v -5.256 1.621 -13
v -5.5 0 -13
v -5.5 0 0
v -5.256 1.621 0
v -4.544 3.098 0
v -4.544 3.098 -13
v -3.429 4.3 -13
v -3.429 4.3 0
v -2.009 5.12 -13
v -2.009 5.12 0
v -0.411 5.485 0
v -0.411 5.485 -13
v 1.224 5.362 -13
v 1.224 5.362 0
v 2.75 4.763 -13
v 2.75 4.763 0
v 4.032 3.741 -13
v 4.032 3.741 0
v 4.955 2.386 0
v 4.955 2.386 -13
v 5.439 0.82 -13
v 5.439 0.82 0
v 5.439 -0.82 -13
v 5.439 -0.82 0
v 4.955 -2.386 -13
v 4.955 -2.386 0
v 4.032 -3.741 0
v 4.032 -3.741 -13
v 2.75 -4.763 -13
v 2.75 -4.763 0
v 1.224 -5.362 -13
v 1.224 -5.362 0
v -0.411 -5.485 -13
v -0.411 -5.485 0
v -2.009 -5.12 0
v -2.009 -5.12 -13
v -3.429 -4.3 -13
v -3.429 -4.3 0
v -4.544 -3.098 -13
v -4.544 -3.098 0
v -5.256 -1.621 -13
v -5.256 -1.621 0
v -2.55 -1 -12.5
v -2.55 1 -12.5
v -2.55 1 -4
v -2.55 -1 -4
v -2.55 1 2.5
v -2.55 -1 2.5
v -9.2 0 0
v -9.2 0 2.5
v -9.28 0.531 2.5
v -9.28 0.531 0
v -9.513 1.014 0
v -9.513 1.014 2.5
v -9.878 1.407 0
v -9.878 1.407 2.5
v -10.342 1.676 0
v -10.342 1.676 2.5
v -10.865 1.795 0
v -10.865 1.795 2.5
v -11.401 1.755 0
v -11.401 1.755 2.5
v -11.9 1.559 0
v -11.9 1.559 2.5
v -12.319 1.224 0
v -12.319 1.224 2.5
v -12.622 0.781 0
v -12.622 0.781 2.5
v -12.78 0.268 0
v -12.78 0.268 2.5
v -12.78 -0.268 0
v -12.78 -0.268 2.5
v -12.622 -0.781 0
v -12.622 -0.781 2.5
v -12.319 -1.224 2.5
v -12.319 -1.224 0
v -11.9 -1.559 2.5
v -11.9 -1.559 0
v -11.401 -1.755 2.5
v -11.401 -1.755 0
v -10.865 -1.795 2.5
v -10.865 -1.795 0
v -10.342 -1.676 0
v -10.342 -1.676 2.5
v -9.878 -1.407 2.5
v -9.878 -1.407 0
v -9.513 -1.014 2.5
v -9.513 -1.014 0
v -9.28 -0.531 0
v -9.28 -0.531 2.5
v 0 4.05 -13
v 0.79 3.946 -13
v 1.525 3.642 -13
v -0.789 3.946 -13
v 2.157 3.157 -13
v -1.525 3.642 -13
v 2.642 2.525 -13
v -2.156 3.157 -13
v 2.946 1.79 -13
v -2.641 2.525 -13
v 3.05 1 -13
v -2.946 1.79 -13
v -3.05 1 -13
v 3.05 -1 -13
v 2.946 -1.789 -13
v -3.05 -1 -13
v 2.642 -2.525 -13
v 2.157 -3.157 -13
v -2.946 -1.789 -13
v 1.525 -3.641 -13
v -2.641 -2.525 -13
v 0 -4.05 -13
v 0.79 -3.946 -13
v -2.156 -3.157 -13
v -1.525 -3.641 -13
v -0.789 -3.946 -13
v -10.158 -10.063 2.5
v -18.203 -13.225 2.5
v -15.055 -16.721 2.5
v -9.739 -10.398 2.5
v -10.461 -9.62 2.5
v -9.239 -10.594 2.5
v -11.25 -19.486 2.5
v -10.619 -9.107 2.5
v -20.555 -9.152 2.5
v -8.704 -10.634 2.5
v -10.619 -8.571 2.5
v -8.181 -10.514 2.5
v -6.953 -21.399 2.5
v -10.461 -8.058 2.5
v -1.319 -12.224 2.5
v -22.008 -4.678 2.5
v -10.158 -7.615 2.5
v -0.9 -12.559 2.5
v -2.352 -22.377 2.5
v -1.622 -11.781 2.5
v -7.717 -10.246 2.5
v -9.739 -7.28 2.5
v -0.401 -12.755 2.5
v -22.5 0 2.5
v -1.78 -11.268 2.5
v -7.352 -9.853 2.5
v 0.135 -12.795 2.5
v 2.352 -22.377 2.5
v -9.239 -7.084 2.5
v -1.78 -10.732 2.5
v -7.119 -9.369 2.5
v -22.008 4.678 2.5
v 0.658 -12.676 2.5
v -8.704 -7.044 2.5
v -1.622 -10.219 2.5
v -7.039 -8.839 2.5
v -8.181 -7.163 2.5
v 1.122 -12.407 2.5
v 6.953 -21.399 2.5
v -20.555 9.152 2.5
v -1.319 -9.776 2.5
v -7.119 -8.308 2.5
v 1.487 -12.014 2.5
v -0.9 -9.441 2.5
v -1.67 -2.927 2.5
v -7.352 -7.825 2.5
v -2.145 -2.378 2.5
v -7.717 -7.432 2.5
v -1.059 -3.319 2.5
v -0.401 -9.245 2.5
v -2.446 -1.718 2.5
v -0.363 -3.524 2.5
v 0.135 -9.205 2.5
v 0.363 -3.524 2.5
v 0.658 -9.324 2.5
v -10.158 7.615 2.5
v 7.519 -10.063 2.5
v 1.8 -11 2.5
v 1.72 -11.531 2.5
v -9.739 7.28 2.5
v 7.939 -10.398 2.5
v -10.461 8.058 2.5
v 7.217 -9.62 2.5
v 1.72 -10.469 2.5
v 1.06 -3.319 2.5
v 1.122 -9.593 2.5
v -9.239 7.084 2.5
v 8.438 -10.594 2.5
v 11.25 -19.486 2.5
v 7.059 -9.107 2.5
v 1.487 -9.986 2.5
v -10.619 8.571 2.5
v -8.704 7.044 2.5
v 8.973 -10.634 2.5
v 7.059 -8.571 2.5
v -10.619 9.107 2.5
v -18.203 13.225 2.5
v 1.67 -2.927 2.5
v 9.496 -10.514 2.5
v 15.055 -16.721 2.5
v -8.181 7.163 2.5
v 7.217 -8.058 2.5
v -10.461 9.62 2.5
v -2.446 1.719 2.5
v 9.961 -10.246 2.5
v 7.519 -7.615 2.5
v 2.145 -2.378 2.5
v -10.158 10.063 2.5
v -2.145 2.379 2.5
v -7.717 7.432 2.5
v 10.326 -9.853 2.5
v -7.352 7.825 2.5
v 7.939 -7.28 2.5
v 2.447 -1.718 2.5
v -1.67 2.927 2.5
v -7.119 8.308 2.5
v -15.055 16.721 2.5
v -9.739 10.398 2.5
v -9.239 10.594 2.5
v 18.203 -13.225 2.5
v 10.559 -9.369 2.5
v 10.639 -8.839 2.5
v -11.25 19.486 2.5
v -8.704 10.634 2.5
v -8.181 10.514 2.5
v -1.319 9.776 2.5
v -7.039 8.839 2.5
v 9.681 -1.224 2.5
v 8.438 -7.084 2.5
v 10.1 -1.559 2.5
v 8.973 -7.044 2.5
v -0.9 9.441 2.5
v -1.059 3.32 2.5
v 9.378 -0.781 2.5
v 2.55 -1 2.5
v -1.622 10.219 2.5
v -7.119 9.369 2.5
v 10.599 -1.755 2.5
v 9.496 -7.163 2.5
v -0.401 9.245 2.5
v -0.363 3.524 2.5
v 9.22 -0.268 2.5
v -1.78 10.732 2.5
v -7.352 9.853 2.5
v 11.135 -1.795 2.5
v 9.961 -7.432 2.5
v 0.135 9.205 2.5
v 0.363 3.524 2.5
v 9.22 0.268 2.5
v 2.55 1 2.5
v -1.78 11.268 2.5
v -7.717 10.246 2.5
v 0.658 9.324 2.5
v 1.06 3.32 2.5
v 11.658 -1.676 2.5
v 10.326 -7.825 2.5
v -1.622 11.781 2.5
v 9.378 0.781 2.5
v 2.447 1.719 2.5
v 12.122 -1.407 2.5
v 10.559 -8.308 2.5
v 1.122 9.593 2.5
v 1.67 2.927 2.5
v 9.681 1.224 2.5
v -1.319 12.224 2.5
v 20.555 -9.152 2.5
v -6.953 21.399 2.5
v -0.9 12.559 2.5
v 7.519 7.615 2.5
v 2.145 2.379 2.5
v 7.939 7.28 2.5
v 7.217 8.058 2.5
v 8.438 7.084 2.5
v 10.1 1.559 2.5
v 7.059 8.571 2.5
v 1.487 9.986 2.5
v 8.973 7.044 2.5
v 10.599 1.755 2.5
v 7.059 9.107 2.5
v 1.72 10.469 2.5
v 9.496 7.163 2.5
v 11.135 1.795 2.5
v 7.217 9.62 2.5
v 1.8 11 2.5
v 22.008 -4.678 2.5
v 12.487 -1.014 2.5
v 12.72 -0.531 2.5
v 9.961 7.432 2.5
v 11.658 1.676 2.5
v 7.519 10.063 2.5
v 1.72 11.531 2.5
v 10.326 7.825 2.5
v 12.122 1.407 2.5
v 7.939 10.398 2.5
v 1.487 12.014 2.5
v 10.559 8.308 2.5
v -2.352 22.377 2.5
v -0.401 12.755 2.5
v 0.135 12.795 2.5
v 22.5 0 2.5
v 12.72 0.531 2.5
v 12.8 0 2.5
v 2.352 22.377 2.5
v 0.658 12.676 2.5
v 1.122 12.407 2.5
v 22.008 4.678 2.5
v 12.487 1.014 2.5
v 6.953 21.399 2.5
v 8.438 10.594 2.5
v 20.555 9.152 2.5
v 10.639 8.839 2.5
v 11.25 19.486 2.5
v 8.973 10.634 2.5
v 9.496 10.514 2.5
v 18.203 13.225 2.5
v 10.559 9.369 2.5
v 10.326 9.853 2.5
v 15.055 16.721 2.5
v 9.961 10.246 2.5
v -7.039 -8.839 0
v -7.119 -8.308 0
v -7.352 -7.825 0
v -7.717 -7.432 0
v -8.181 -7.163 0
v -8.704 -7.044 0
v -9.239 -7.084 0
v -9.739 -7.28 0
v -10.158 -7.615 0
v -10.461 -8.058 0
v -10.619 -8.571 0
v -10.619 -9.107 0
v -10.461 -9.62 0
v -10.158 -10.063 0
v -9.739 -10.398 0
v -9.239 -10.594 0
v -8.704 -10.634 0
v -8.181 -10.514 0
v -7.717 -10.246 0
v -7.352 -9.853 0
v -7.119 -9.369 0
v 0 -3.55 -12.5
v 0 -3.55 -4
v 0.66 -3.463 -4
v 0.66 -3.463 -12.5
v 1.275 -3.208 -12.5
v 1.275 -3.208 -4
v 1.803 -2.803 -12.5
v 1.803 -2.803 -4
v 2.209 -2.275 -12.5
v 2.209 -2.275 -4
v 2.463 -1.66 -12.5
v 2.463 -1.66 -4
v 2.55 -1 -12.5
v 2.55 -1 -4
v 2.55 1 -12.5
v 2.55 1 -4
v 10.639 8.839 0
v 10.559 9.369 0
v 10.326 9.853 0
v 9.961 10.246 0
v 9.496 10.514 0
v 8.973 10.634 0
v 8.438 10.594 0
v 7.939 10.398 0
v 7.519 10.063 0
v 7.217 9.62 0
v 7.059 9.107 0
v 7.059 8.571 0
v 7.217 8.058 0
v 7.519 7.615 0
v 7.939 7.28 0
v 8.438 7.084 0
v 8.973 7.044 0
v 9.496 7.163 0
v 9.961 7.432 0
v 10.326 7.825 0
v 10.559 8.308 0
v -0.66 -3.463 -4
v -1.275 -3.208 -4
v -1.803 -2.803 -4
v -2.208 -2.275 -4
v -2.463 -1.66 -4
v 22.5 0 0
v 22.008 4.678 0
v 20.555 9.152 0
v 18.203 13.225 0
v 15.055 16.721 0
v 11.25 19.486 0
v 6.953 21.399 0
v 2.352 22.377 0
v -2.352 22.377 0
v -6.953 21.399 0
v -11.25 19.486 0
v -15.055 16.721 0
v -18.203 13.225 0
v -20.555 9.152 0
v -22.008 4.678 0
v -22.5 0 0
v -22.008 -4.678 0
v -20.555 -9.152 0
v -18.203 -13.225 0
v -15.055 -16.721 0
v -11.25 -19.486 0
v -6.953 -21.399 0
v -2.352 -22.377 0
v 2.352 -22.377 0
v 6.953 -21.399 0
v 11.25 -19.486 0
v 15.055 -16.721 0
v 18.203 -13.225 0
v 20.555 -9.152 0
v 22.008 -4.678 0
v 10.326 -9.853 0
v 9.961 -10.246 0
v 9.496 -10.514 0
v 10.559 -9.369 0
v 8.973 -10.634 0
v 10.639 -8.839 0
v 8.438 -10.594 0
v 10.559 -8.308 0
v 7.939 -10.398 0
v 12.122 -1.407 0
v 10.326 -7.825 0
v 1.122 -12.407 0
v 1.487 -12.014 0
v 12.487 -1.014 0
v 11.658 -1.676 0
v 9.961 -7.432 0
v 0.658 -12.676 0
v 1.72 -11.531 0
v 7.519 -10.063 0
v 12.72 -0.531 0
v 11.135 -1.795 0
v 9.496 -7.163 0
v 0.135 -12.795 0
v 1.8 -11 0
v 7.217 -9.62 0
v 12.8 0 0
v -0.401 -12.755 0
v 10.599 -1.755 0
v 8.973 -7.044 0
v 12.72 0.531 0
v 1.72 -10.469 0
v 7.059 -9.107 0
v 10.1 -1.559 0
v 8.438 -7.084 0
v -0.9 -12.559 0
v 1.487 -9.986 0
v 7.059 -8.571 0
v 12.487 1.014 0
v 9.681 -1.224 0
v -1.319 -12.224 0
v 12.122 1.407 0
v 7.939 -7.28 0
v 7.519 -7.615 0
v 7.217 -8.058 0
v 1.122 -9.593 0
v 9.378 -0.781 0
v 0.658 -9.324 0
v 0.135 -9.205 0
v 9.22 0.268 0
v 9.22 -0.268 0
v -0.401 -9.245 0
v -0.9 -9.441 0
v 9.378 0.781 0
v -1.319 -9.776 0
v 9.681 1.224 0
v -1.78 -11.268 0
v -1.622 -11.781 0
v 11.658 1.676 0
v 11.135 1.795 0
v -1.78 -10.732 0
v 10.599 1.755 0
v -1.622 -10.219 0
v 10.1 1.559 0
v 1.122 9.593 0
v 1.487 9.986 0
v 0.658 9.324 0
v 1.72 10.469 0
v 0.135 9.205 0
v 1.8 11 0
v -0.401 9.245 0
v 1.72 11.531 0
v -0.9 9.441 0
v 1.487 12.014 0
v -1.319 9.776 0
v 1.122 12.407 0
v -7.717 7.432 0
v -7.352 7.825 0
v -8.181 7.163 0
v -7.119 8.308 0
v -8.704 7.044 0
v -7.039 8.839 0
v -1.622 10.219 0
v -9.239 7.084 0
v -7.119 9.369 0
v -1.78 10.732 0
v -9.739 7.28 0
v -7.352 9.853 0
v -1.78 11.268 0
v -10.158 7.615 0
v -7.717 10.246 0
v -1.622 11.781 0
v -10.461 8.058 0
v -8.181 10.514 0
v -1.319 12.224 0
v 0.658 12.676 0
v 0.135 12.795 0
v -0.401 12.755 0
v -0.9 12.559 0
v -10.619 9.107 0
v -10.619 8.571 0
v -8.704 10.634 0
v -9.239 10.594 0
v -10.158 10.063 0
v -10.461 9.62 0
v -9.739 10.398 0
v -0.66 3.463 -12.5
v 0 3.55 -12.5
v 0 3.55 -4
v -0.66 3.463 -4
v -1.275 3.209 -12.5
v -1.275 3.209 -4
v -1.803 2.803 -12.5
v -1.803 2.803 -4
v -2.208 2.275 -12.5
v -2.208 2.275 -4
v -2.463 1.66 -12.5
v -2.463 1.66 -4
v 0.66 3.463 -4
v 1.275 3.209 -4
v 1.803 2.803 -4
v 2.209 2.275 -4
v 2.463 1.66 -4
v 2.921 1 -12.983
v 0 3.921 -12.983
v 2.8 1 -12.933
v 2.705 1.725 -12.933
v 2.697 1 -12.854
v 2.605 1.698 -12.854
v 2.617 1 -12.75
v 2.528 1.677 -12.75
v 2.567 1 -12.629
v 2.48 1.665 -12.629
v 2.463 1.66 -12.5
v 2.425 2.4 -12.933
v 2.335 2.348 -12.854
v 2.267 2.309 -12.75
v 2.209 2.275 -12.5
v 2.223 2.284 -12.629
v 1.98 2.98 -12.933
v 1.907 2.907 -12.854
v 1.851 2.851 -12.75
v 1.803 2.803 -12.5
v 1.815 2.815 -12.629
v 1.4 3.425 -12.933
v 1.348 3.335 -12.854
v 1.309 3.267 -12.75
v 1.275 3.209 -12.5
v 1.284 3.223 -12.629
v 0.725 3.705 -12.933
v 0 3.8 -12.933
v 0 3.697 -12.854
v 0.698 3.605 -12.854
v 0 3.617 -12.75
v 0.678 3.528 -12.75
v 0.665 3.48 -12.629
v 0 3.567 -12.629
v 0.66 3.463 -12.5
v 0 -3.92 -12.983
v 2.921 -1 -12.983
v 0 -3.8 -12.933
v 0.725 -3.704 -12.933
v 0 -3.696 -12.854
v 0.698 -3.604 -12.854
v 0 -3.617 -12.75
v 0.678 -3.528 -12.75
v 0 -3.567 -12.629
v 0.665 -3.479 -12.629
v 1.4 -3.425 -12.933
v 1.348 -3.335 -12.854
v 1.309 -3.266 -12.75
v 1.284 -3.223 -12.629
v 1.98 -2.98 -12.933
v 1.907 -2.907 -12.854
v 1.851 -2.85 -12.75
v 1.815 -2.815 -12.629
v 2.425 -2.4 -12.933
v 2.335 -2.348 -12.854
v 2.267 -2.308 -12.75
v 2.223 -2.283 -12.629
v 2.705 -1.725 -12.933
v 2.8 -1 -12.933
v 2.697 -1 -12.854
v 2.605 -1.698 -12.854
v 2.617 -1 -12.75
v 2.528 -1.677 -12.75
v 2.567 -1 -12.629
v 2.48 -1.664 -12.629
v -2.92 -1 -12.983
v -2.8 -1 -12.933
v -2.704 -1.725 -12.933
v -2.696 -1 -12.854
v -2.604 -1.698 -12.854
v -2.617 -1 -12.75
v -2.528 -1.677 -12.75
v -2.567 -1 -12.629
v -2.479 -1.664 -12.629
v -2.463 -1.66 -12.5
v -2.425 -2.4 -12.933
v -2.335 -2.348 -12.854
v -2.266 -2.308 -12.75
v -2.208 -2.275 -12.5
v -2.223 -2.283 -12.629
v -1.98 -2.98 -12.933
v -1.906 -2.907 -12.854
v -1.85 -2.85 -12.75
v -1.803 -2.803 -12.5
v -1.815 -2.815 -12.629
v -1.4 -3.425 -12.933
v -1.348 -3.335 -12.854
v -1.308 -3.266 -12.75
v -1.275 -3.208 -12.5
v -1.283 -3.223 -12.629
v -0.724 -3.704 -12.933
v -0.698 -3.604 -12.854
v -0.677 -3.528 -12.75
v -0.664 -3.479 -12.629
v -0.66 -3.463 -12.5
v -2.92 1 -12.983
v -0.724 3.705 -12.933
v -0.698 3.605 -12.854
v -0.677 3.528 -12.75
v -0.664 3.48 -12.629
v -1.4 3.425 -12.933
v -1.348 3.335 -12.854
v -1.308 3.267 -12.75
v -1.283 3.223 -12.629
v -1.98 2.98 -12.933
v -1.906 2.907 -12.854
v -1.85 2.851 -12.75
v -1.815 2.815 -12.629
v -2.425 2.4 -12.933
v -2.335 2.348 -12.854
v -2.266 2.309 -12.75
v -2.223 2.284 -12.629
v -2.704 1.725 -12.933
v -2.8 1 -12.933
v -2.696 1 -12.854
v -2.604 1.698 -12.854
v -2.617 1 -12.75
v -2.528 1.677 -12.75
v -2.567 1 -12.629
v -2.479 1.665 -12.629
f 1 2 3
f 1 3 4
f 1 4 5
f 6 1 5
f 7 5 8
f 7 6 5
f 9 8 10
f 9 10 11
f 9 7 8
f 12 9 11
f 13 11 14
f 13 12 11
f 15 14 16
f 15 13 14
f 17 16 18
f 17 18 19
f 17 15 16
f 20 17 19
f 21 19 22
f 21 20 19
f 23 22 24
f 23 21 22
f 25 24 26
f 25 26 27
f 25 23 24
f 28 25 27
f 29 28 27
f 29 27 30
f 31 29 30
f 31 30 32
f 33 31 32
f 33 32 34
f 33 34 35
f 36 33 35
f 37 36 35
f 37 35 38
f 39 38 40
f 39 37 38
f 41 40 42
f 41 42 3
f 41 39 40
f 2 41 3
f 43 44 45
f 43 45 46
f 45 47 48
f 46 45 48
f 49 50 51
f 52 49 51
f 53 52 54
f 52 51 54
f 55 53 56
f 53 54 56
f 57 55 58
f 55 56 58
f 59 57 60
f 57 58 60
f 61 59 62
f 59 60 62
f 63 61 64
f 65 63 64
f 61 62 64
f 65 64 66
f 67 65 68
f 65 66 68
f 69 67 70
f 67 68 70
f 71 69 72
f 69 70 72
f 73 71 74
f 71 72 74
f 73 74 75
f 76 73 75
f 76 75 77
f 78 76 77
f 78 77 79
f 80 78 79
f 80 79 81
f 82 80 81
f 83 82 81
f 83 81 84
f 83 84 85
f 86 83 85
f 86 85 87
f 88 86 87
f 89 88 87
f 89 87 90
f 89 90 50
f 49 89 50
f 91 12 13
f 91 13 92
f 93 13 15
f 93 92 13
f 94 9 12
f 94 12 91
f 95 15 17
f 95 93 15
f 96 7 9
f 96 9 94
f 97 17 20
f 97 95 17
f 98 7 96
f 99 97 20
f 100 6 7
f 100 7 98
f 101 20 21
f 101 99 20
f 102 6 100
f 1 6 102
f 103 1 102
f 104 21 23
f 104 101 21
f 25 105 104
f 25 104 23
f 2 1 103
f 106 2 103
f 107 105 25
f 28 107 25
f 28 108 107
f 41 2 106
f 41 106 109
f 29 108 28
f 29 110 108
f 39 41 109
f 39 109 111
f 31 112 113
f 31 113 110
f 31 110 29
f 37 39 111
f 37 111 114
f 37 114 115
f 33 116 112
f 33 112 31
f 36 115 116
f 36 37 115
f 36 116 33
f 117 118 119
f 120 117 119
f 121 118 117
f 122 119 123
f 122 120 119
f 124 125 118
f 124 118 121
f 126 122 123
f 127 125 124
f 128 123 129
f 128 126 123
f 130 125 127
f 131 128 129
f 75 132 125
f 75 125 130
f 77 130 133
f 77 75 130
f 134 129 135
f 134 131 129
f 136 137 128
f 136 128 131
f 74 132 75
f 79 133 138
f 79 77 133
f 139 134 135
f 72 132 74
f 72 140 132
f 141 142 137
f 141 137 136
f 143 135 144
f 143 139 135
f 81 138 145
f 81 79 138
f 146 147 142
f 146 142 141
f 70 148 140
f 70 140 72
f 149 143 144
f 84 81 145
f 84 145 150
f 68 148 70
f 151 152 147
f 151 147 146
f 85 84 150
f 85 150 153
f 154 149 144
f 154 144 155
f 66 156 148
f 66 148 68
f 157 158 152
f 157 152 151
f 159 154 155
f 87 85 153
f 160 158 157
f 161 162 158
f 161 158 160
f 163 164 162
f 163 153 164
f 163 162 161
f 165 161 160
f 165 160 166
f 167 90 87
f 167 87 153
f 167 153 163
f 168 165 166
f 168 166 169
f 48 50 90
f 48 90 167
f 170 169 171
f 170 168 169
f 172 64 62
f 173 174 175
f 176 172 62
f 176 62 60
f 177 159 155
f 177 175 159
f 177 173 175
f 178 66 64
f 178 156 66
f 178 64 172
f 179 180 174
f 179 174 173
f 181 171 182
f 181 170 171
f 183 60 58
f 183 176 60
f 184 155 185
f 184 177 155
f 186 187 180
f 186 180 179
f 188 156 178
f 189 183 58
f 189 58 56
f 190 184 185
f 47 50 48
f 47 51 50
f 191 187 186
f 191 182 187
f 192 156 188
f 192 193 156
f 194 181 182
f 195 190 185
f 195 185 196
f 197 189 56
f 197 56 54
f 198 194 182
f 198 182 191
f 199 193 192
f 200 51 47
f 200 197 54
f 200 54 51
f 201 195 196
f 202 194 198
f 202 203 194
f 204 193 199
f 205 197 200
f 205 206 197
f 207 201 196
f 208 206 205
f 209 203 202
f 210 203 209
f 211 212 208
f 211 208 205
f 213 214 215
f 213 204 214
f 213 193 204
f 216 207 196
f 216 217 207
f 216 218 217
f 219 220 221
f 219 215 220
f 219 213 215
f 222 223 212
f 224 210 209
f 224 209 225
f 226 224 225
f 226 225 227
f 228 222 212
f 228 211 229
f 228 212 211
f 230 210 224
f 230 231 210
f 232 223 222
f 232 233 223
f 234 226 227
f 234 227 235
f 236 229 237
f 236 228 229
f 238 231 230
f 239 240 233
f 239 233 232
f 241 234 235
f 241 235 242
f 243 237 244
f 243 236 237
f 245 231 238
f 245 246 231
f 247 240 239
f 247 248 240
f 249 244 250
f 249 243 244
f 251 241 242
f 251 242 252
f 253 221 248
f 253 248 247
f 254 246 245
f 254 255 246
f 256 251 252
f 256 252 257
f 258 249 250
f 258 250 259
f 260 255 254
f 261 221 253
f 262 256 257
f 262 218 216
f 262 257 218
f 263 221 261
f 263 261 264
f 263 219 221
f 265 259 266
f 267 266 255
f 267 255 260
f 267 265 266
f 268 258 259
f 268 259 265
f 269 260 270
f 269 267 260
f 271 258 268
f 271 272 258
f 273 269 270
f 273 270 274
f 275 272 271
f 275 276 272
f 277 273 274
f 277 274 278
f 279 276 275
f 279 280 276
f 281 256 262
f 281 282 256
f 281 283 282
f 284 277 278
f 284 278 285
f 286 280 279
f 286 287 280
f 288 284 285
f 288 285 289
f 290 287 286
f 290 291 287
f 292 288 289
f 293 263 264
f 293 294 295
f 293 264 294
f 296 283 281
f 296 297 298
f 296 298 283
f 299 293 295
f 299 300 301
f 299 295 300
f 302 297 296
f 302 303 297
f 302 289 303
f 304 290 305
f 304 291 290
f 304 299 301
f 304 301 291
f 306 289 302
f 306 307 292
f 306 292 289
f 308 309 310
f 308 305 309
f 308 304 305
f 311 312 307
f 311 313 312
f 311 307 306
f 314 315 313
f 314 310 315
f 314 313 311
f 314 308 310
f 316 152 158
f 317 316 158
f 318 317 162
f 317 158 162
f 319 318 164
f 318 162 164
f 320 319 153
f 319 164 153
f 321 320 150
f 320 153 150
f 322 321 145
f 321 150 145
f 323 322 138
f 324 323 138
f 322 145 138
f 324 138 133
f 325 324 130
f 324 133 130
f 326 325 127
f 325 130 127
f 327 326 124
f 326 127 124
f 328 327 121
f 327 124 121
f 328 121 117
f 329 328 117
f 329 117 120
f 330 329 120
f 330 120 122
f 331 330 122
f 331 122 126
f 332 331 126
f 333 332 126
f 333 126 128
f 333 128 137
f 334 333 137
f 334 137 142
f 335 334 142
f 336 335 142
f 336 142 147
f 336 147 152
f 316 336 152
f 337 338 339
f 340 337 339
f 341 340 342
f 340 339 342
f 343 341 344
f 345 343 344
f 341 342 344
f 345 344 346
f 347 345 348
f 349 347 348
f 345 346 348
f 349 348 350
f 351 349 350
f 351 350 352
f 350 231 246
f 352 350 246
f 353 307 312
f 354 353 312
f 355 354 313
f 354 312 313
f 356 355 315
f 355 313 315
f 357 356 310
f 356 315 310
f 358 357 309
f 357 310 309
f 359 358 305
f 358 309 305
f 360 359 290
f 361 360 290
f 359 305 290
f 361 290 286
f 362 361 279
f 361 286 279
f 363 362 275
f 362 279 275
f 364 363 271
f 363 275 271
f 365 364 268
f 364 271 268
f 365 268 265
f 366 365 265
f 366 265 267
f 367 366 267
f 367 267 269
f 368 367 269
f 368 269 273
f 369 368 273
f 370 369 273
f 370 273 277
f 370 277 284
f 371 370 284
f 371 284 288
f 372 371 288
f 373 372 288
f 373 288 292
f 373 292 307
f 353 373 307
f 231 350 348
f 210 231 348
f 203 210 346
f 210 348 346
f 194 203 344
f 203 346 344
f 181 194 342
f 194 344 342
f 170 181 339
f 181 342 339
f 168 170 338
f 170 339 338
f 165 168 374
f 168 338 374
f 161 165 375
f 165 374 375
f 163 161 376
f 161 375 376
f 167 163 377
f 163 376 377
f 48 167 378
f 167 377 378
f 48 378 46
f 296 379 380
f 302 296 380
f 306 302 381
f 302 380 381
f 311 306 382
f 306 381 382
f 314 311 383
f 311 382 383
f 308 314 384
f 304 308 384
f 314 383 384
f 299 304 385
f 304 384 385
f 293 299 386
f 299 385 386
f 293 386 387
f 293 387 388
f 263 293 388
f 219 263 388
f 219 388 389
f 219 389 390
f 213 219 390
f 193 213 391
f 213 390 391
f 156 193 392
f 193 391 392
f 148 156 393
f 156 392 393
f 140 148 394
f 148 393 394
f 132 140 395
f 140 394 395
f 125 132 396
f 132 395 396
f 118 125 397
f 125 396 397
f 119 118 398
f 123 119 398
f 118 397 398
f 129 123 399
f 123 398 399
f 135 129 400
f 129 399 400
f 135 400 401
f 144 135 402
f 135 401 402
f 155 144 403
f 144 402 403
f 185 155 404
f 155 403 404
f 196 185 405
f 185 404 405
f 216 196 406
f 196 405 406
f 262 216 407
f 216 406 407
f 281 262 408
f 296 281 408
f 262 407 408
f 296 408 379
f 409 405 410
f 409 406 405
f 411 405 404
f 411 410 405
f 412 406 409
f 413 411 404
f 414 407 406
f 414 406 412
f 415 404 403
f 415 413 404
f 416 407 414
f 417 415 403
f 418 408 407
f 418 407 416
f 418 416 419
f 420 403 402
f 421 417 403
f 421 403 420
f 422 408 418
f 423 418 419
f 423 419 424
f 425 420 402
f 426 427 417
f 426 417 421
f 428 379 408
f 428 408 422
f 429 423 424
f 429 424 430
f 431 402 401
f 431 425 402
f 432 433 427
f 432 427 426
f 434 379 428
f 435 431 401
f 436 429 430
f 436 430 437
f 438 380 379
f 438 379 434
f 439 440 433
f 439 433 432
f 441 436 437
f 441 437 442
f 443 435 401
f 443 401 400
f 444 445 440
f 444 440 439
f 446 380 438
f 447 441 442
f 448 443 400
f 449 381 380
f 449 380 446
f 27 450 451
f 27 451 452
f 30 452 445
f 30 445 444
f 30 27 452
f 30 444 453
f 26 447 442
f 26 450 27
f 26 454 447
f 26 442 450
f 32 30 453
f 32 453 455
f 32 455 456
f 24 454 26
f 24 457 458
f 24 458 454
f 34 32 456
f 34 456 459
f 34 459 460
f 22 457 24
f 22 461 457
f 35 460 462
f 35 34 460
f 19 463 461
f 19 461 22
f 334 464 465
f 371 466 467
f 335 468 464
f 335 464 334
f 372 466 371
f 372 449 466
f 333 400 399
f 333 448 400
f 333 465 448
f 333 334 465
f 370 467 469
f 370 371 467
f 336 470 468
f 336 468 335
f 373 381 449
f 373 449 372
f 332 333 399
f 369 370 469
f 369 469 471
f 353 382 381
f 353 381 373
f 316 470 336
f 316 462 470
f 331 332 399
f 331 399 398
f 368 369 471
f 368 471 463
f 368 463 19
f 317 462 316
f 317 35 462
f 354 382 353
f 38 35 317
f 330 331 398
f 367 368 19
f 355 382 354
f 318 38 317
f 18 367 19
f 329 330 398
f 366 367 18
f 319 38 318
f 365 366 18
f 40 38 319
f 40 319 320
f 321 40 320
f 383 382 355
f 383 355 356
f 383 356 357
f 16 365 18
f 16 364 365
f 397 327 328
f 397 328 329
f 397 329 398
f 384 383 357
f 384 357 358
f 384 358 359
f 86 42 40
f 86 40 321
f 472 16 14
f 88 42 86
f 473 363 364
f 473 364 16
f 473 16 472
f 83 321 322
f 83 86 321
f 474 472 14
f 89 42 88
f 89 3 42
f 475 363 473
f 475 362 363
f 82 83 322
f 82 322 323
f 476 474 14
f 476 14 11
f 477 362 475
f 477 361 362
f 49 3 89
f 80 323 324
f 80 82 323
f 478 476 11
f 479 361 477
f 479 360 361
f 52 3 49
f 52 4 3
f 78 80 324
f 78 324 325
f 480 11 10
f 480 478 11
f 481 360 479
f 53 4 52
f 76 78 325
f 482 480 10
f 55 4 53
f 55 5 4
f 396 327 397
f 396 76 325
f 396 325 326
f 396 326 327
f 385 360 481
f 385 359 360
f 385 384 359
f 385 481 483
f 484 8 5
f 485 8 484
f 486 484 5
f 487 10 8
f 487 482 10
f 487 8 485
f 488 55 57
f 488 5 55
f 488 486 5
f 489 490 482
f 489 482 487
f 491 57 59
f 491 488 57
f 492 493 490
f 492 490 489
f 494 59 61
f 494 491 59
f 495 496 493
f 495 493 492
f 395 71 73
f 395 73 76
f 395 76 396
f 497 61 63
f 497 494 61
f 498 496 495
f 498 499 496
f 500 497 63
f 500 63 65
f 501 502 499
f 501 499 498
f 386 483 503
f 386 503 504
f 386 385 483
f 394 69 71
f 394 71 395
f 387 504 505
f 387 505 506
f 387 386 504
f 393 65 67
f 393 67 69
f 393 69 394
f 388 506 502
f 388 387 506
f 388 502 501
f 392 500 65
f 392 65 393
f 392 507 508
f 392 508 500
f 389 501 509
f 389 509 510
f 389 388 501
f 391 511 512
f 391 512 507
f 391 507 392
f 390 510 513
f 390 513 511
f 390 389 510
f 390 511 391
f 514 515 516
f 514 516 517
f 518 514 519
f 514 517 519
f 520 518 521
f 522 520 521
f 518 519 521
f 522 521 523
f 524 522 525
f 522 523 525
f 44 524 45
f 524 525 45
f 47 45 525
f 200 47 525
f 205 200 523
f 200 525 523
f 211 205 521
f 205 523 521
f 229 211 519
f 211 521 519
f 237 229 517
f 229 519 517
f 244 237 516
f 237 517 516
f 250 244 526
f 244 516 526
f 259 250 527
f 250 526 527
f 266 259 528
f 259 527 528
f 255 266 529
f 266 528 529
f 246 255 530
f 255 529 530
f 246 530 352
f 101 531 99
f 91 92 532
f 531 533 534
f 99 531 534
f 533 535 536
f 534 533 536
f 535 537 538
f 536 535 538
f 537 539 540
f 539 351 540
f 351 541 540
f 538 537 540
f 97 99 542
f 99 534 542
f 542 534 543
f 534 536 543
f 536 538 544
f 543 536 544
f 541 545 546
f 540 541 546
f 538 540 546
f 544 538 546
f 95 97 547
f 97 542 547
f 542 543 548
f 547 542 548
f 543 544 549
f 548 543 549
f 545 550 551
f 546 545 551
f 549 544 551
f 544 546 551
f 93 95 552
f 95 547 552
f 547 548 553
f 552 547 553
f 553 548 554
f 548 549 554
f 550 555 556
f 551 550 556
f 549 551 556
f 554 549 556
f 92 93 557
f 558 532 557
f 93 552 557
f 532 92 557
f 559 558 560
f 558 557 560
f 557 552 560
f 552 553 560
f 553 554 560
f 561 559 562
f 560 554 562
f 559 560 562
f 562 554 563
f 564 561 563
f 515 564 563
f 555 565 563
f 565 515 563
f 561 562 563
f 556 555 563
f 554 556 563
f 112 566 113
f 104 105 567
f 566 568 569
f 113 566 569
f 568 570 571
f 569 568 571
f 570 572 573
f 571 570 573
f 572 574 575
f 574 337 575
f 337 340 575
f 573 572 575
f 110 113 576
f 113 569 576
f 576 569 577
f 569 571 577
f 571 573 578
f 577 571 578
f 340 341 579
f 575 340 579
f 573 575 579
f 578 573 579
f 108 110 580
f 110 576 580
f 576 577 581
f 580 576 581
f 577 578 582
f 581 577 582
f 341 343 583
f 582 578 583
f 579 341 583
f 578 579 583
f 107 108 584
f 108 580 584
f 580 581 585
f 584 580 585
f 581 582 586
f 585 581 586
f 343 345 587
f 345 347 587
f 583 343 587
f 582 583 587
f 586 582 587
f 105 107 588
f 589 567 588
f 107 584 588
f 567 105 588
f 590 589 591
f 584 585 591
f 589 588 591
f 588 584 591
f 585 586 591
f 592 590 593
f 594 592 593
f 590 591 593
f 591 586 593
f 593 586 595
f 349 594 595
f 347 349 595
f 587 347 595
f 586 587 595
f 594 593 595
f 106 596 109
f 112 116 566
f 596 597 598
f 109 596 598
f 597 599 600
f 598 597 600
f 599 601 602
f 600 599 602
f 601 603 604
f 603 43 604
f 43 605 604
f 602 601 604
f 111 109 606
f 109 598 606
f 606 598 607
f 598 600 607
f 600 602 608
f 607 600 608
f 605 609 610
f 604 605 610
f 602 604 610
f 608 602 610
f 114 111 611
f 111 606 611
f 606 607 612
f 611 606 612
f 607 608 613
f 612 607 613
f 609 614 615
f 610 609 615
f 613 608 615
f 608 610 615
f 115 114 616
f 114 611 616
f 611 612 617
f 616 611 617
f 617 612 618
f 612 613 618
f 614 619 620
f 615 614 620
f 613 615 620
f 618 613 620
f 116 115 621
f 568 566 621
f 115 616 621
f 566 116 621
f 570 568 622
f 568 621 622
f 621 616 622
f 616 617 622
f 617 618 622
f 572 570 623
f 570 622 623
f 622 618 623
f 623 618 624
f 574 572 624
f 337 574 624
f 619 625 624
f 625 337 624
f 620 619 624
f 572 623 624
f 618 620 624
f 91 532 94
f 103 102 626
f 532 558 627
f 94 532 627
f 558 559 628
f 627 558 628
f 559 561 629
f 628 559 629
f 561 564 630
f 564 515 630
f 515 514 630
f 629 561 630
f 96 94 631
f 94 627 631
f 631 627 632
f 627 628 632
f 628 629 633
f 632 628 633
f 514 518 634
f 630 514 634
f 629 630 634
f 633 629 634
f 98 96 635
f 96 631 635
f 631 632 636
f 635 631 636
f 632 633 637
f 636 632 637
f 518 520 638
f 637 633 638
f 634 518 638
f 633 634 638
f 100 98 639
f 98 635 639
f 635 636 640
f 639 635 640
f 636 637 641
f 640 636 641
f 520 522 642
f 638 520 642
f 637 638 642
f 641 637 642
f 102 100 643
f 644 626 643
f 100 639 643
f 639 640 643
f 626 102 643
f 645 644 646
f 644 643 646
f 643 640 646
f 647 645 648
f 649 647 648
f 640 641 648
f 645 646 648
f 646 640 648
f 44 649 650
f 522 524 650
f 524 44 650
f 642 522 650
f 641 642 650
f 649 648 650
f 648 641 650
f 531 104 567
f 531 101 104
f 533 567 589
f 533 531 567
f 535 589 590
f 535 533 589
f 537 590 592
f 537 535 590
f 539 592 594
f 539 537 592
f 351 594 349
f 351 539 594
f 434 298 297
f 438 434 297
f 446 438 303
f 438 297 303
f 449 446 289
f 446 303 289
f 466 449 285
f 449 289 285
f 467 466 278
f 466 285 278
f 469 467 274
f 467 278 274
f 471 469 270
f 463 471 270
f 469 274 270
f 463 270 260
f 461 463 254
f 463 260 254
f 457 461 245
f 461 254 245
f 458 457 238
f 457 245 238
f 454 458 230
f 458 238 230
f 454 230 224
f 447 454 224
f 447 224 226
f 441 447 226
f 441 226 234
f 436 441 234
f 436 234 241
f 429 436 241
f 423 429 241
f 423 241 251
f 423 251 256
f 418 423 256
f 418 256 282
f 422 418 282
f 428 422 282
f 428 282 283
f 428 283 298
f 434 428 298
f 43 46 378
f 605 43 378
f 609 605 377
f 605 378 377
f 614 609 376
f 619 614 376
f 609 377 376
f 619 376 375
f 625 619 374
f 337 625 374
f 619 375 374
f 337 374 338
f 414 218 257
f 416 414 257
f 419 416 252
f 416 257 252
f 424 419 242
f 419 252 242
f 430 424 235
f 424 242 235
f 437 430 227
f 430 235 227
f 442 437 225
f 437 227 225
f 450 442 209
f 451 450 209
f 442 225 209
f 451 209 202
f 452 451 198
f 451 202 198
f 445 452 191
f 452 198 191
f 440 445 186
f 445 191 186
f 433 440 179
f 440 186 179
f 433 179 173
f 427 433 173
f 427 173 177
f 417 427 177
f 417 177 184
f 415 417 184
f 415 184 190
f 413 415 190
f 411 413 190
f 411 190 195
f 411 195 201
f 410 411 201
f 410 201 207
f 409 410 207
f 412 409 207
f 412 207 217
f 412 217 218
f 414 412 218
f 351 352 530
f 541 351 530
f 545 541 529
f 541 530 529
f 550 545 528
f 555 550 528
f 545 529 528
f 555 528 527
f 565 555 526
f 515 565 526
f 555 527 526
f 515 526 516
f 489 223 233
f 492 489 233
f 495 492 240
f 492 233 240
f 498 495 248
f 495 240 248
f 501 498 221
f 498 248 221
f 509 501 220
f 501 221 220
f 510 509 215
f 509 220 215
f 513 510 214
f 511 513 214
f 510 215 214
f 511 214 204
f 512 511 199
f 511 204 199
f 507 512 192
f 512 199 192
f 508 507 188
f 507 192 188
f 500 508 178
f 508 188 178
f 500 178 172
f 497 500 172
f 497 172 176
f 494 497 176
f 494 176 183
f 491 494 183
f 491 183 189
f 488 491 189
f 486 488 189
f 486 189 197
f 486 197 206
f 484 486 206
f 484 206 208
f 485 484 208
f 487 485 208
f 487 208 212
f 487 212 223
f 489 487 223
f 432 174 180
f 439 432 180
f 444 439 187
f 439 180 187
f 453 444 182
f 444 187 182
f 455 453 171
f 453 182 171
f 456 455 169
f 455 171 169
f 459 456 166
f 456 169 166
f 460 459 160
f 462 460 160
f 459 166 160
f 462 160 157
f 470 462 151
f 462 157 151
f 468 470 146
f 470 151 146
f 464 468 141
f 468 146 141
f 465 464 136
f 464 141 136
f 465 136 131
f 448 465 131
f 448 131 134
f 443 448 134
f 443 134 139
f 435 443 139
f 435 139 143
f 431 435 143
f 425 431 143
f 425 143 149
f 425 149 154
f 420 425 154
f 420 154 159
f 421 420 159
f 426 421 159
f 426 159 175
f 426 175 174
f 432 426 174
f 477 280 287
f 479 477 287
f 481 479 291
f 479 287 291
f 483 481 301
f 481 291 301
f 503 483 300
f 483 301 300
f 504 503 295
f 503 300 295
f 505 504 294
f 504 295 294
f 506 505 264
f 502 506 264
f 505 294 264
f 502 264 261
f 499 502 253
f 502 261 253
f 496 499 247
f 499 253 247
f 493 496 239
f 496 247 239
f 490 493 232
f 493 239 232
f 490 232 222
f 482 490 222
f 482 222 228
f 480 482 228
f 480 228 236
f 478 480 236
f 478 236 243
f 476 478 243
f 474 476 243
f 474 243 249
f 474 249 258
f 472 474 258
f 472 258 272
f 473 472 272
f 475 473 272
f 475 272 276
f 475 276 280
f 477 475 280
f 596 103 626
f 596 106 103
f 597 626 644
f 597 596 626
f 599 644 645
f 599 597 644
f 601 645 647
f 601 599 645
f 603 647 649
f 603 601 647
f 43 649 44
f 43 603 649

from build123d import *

# Parameters (mm, degrees)
SKETCH_1_R          = 22.5
EXTRUDE_1_DEPTH     = 2.5
SKETCH_4_R          = 7.5
EXTRUDE_2_DEPTH     = 4
SKETCH_5_R          = 7.5
SKETCH_5_R_2        = 3.55
EXTRUDE_3_DEPTH     = 9
SKETCH_6_R          = 1.8
CUT_EXTRUDE_2_DEPTH = 6
FILLET_1_R          = 0.5
CUT_EXTRUDE_3_DEPTH = 34.068111528
SKETCH_8_R          = 7.500275011
SKETCH_8_R_2        = 5.5
CUT_EXTRUDE_4_DEPTH = 13


with BuildPart() as part:
    # 草图1 → 凸台-拉伸1 (new body)
    with BuildSketch(Plane.XY):
        Circle(SKETCH_1_R)
    extrude(amount=EXTRUDE_1_DEPTH)

    # 草图4 → 凸台-拉伸2 (add)
    with BuildSketch(Plane(origin=(0, 0, 0), x_dir=(-1, 0, 0), z_dir=(0, 0, -1))):
        Circle(SKETCH_4_R)
    extrude(amount=EXTRUDE_2_DEPTH)

    # 草图5 → 凸台-拉伸3 (add)
    # profile 1 of 3: a face of its own
    with BuildSketch(Plane(origin=(0, 0, -4), x_dir=(-1, 0, 0), z_dir=(0, 0, -1))):
        with Locations(Location((0, 0, 0), (0, 0, 239.61601222))):
            Circle(SKETCH_5_R)
        with Locations((-0.000237242, 0.000139094)):
            Circle(SKETCH_5_R_2, mode=Mode.SUBTRACT)
    # profile 2 of 3: a face of its own
    with BuildSketch(Plane(origin=(0, 0, -4), x_dir=(-1, 0, 0), z_dir=(0, 0, -1))):
        with BuildLine():
            ThreePointArc((-0.000237242, -3.549860906), (-1.803359534, -2.802983198), (-2.550237242, -0.999860906))
            Line((-2.550237242, -0.999860906), (-2.550237242, 1.000139094))
            ThreePointArc((-2.550237242, 1.000139094), (-1.803359534, 2.803261386), (-0.000237242, 3.550139094))
            ThreePointArc((-0.000237242, 3.550139094), (-3.550237242, 0.000139094), (-0.000237242, -3.549860906))
        make_face()
    # profile 3 of 3: a face of its own
    with BuildSketch(Plane(origin=(0, 0, -4), x_dir=(-1, 0, 0), z_dir=(0, 0, -1))):
        with BuildLine():
            ThreePointArc((2.549762758, -0.999860906), (1.80288505, -2.802983198), (-0.000237242, -3.549860906))
            ThreePointArc((-0.000237242, -3.549860906), (2.509991831, -2.510089979), (3.549762758, 0.000139094))
            ThreePointArc((3.549762758, 0.000139094), (2.509991831, 2.510368167), (-0.000237242, 3.550139094))
            ThreePointArc((-0.000237242, 3.550139094), (1.80288505, 2.803261386), (2.549762758, 1.000139094))
            Line((2.549762758, 1.000139094), (2.549762758, -0.999860906))
        make_face()
    extrude(amount=EXTRUDE_3_DEPTH)

    # 草图6 → 切除-拉伸2 (cut)
    with BuildSketch(Plane.XY.offset(2.5)):
        with Locations((0, 11)):
            Circle(SKETCH_6_R)
        with Locations((-8.838834765, 8.838834765)):
            Circle(SKETCH_6_R)
        with Locations((8.838834765, 8.838834765)):
            Circle(SKETCH_6_R)
        with Locations((8.838834765, -8.838834765)):
            Circle(SKETCH_6_R)
        with Locations((-8.838834765, -8.838834765)):
            Circle(SKETCH_6_R)
        with Locations((11, 0)):
            Circle(SKETCH_6_R)
        with Locations((0, -11)):
            Circle(SKETCH_6_R)
        with Locations((-11, 0)):
            Circle(SKETCH_6_R)
    extrude(amount=-CUT_EXTRUDE_2_DEPTH, mode=Mode.SUBTRACT)

    # 圆角1
    fillet_1_edges = [part.edges().sort_by_distance(p)[0] for p in [
        (0.000237242, -3.549860906, -13),
        (0.000237242, 3.550139094, -13),
        (-2.549762758, 0.000139094, -13),
        (2.550237242, 0.000139094, -13),
    ]]
    fillet(fillet_1_edges, radius=FILLET_1_R)

    # 草图7 → 切除-拉伸3 (cut, through all)
    with BuildSketch(Plane(origin=(0, 0, -4), x_dir=(-1, 0, 0), z_dir=(0, 0, -1))):
        with BuildLine():
            Line((-2.550237242, 1.000139094), (-2.550237242, -0.999860906))
            ThreePointArc((-2.550237242, -0.999860906), (-0.000237242, -3.549860906), (2.549762758, -0.999860906))
            Line((2.549762758, -0.999860906), (2.549762758, 1.000139094))
            ThreePointArc((2.549762758, 1.000139094), (-0.000237242, 3.550139094), (-2.550237242, 1.000139094))
        make_face()
    extrude(amount=-CUT_EXTRUDE_3_DEPTH, mode=Mode.SUBTRACT)

    # 草图8 → 切除-拉伸4 (cut)
    with BuildSketch(Plane(origin=(0, 0, -13), x_dir=(-1, 0, 0), z_dir=(0, 0, -1))):
        Circle(SKETCH_8_R)
        Circle(SKETCH_8_R_2, mode=Mode.SUBTRACT)
    extrude(amount=-CUT_EXTRUDE_4_DEPTH, mode=Mode.SUBTRACT)


solid = part.part
